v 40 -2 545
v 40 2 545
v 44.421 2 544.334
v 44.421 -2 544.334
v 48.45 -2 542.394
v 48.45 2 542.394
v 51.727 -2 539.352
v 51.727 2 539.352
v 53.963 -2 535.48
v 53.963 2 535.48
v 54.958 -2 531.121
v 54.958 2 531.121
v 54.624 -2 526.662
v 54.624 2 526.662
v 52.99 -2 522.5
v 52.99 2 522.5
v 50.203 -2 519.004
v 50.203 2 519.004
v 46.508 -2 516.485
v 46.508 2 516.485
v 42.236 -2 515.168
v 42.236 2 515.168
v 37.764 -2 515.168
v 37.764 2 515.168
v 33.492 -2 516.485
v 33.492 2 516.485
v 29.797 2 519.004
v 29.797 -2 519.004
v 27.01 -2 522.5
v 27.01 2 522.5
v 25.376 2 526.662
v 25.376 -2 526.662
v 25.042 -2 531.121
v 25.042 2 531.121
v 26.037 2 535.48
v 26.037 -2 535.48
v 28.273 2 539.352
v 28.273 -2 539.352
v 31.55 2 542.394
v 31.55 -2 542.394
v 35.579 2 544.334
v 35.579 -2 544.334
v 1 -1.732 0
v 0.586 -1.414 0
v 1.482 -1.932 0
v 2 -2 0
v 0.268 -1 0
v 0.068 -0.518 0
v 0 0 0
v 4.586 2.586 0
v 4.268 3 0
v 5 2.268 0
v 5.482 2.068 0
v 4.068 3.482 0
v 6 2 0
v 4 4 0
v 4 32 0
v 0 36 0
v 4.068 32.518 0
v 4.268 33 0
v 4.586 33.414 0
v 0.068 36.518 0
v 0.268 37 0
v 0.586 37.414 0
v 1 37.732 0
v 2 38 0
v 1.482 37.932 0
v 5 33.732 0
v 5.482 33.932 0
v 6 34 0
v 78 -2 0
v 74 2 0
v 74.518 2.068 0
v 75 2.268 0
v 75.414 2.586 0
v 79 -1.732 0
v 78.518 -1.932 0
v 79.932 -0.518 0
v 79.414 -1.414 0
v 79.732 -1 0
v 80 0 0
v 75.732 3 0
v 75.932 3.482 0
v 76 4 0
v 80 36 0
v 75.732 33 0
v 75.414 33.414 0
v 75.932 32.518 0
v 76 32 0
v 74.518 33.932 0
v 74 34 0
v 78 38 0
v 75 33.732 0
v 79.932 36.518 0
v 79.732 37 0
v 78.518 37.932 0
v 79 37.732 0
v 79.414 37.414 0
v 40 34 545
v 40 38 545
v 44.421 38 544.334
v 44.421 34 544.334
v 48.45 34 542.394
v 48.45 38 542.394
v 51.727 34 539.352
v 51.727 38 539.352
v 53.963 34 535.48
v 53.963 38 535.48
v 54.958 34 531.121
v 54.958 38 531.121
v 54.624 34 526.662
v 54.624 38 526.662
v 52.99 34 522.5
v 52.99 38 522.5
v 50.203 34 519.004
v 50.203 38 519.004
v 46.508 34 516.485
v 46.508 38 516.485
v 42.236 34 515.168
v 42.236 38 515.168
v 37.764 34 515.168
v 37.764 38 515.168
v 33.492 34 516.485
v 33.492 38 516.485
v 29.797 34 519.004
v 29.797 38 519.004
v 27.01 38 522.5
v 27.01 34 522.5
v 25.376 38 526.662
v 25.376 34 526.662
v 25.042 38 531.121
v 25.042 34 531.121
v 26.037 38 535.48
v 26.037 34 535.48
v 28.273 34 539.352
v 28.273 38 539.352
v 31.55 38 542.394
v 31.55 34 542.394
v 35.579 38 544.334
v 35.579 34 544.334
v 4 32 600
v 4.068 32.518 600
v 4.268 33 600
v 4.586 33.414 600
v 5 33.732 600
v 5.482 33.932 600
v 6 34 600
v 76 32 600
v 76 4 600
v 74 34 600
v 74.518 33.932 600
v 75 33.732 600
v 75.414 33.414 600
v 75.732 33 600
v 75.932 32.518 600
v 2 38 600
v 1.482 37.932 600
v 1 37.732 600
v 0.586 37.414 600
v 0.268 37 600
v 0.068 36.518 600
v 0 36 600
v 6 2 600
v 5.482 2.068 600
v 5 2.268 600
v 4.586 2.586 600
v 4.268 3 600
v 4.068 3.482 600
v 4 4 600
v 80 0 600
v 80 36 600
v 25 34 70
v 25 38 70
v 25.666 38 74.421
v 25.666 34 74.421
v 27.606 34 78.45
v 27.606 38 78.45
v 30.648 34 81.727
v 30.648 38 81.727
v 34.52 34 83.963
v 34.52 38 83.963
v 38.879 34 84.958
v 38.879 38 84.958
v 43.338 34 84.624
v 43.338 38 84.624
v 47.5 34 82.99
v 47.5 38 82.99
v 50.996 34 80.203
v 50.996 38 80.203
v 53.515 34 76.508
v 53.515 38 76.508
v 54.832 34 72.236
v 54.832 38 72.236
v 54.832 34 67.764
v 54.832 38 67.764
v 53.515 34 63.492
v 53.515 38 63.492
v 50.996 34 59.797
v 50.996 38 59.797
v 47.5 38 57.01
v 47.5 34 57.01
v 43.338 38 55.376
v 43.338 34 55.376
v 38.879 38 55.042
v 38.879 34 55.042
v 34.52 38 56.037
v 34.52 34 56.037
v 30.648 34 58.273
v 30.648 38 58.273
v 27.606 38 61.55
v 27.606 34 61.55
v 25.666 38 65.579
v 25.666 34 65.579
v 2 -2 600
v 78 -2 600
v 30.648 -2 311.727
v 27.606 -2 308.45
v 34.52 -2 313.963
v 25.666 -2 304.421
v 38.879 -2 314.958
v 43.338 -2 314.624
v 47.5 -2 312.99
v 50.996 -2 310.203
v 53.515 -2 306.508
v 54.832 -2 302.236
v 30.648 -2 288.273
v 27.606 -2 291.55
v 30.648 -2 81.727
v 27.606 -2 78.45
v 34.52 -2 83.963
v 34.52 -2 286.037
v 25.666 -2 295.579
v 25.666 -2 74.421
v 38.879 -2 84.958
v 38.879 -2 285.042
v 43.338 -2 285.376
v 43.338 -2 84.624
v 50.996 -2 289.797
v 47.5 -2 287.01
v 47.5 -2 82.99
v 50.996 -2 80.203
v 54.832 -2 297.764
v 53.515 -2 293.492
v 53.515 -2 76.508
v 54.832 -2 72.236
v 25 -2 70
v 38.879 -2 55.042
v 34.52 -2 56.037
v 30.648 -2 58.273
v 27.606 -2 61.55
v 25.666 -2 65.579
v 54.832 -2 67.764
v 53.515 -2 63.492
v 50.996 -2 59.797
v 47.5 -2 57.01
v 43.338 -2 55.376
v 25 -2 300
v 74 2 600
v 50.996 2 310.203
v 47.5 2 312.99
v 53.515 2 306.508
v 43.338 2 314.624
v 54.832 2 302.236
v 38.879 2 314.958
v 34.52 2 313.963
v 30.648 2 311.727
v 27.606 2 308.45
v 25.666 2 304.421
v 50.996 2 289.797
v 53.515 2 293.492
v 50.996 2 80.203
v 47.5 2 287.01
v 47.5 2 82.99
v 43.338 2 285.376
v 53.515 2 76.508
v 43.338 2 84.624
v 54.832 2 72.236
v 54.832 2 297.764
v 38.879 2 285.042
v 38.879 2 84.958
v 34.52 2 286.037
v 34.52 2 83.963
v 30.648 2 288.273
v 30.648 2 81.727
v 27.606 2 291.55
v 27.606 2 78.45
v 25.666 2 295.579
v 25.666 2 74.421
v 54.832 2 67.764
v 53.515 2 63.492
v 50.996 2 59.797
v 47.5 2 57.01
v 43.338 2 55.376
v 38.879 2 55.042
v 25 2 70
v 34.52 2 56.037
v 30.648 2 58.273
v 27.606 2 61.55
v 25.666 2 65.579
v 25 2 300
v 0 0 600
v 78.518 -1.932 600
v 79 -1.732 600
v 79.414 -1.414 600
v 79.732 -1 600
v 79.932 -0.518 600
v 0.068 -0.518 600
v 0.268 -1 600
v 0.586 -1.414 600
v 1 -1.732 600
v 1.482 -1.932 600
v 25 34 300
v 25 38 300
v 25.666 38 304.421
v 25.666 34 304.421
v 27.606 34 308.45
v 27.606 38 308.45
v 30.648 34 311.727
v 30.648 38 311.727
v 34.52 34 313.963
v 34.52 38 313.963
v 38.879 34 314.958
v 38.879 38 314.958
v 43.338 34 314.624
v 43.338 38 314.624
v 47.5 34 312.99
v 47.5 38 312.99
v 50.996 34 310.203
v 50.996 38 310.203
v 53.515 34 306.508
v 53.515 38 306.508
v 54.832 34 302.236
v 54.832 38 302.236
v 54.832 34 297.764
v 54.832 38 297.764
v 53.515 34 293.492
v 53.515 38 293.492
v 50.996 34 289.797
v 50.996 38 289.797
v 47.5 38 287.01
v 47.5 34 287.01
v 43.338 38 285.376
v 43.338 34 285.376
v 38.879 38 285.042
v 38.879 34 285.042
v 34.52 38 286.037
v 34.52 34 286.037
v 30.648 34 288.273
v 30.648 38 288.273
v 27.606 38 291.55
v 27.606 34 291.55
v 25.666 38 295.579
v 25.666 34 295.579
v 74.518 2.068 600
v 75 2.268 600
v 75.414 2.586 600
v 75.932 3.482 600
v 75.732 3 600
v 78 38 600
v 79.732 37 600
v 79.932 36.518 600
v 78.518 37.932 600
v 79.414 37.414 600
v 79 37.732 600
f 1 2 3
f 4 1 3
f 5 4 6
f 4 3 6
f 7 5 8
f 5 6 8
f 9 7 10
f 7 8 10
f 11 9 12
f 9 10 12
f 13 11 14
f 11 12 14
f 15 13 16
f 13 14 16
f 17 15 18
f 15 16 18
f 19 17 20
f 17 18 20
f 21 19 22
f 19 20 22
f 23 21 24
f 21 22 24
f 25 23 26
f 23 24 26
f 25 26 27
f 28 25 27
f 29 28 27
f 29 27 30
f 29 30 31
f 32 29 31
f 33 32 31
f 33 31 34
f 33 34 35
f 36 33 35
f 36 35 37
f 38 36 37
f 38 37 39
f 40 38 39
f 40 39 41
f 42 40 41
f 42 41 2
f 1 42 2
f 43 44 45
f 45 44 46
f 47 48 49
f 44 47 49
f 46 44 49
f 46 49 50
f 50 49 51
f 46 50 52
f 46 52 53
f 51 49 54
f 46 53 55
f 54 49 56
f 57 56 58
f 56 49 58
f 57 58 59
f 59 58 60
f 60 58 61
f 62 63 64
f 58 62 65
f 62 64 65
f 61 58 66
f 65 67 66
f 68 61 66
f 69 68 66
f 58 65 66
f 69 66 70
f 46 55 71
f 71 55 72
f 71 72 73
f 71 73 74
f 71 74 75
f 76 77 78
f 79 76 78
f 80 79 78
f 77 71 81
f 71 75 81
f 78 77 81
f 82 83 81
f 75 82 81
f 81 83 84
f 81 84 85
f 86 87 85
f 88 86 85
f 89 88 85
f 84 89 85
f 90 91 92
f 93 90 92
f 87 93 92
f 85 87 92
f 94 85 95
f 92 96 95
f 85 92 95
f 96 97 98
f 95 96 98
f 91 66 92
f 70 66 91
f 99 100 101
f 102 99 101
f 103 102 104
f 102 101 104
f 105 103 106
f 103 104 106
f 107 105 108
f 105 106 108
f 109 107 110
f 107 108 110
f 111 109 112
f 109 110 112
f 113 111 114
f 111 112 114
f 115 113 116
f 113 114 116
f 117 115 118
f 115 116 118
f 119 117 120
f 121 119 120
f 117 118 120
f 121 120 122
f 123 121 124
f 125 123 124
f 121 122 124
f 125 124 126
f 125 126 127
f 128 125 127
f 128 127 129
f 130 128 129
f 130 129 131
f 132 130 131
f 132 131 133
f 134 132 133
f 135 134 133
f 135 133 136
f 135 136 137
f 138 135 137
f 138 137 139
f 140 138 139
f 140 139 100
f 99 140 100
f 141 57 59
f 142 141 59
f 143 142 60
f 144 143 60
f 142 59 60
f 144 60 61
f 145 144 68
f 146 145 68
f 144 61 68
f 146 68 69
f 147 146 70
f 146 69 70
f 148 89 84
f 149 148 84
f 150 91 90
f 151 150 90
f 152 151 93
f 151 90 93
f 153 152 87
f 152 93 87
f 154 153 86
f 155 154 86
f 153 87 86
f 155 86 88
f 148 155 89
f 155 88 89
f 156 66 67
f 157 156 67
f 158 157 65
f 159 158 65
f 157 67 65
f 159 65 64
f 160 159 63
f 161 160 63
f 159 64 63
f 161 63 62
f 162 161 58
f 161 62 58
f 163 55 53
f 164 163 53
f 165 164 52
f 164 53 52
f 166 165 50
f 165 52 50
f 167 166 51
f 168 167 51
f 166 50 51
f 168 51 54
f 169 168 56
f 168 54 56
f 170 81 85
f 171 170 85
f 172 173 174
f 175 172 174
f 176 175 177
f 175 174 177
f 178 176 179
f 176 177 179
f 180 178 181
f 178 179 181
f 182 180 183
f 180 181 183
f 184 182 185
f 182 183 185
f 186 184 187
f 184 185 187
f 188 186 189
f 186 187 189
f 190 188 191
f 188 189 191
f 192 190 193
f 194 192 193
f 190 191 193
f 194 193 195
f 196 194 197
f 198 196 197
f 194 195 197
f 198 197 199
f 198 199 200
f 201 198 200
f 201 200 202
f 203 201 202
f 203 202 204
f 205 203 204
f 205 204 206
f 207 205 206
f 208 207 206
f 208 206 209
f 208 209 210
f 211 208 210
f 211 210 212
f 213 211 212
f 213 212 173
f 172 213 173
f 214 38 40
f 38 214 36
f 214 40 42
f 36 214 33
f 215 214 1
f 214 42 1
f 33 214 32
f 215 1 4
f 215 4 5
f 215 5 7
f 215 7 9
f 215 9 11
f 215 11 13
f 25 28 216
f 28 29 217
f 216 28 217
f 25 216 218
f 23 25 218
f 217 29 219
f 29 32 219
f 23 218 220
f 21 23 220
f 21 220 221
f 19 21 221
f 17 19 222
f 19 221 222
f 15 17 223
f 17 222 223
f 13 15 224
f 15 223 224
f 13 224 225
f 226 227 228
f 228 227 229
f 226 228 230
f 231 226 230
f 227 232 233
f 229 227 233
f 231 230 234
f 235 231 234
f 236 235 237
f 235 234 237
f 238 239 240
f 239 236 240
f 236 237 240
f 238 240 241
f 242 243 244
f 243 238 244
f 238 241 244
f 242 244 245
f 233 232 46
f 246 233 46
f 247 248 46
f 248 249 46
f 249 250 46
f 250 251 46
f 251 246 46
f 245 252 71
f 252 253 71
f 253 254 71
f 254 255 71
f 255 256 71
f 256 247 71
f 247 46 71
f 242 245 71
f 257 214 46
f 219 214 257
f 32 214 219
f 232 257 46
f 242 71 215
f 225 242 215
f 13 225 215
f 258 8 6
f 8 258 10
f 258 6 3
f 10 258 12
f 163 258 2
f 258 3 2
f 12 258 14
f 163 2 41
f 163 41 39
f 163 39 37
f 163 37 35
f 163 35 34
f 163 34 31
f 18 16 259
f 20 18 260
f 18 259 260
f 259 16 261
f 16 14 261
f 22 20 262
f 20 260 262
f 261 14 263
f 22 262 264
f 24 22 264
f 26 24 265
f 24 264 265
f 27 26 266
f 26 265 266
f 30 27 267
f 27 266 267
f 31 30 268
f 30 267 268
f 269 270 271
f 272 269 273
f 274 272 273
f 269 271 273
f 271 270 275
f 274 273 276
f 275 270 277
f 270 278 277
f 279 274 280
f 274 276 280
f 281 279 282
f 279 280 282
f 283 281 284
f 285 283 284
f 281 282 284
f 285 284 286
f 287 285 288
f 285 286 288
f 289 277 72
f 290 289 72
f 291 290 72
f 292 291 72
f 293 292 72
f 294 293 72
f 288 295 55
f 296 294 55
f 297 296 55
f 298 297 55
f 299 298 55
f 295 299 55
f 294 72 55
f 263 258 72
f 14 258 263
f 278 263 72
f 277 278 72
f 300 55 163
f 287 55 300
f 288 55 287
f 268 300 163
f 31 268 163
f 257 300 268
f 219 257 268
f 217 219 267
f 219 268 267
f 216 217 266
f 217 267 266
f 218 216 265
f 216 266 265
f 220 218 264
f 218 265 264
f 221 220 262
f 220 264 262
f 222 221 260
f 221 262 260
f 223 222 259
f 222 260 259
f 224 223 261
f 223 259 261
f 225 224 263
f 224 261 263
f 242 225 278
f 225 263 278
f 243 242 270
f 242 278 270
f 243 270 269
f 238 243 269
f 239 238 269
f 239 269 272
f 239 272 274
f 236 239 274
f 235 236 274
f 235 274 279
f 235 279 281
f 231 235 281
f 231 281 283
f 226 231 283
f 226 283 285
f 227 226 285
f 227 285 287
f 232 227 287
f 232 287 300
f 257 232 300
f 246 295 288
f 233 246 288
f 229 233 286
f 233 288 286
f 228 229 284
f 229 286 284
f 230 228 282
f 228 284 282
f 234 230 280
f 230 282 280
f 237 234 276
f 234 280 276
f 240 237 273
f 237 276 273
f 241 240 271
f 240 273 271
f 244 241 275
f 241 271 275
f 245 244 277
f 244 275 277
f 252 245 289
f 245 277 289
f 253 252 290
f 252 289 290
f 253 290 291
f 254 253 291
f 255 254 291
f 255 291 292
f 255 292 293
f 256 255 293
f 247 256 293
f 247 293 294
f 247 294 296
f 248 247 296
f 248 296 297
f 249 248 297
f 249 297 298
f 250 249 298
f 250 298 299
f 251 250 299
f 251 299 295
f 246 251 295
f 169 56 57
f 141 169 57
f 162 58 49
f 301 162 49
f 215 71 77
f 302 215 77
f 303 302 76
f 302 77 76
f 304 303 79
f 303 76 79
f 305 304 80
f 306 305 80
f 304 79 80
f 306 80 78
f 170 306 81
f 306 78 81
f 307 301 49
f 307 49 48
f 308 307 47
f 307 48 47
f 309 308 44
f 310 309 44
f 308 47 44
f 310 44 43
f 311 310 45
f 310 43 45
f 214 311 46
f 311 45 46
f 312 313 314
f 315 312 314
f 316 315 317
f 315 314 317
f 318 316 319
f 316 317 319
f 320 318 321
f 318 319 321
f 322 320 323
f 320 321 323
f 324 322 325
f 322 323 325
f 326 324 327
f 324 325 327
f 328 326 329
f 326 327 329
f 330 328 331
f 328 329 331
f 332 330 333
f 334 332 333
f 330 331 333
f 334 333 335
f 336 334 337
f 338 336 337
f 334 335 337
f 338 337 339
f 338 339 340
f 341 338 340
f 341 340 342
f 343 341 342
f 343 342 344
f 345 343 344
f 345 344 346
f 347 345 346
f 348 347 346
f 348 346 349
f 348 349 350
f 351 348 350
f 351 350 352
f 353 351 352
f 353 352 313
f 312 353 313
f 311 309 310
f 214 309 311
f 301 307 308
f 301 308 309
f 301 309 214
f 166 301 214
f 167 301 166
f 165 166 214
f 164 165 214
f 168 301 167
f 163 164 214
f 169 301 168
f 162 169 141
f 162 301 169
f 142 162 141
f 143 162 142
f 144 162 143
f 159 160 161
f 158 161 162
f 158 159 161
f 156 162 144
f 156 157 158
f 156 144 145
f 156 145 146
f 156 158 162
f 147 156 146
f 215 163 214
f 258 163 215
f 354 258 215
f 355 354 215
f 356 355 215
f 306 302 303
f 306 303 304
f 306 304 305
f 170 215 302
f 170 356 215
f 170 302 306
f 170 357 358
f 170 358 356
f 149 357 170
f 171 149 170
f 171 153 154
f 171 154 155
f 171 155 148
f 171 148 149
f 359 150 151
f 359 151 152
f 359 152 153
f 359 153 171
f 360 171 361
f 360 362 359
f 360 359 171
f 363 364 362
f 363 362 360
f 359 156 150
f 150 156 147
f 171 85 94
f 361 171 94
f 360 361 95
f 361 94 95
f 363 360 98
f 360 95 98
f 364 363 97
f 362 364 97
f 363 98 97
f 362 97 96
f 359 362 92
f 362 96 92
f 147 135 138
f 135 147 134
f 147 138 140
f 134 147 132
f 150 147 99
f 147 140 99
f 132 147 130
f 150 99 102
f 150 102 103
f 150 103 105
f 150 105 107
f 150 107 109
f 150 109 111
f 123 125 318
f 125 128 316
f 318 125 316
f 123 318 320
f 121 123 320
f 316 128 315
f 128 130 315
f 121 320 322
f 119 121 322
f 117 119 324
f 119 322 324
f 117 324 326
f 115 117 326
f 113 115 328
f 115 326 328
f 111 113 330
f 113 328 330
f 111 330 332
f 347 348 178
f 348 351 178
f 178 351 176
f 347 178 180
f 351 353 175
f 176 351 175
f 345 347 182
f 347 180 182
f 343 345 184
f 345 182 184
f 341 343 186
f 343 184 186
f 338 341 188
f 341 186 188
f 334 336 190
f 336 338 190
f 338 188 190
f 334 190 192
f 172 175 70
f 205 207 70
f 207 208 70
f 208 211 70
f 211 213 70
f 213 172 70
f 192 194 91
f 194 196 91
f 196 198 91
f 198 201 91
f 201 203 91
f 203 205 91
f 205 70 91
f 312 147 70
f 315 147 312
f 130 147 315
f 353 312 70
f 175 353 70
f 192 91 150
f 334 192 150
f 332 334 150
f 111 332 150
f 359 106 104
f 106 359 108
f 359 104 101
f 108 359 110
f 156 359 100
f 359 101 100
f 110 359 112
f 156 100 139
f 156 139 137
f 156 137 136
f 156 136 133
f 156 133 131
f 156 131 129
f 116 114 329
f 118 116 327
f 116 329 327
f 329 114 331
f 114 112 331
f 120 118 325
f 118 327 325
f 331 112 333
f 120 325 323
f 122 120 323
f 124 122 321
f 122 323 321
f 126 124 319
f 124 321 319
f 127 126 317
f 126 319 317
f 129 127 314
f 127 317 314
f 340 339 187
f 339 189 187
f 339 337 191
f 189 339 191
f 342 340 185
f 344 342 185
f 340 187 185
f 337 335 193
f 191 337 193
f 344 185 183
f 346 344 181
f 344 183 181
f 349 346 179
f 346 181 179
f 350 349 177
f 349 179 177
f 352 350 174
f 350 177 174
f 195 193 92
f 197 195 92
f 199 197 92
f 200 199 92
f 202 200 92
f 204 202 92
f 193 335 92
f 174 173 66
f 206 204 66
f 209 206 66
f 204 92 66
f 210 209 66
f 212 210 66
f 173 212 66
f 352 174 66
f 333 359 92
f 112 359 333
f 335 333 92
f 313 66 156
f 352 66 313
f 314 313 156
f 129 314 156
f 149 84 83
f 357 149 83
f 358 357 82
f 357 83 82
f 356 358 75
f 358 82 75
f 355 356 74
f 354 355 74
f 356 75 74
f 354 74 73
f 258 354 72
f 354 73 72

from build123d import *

# Parameters (mm, degrees)
BOSS_EXTRU_1_DEPTH      = 600
ESQUISSE2_R             = 15
ENL_V_MAT_EXTRU_1_DEPTH = 607.630035524


with BuildPart() as part:
    # Esquisse1 → Boss.-Extru.1 (new body)
    with BuildSketch(Plane.XY):
        with BuildLine():
            Line((2, -2), (78, -2))
            ThreePointArc((78, -2), (79.414213562, -1.414213562), (80, 0))
            Line((80, 0), (80, 36))
            ThreePointArc((80, 36), (79.414213562, 37.414213562), (78, 38))
            Line((78, 38), (2, 38))
            ThreePointArc((2, 38), (0.585786438, 37.414213562), (0, 36))
            Line((0, 36), (0, 0))
            ThreePointArc((0, 0), (0.585786438, -1.414213562), (2, -2))
        make_face()
        with BuildLine():
            Line((4, 4), (4, 32))
            ThreePointArc((4, 32), (4.585786438, 33.414213562), (6, 34))
            Line((6, 34), (74, 34))
            ThreePointArc((74, 34), (75.414213562, 33.414213562), (76, 32))
            Line((76, 32), (76, 4))
            ThreePointArc((76, 4), (75.414213562, 2.585786438), (74, 2))
            Line((74, 2), (6, 2))
            ThreePointArc((6, 2), (4.585786438, 2.585786438), (4, 4))
        make_face(mode=Mode.SUBTRACT)
    extrude(amount=BOSS_EXTRU_1_DEPTH)

    # Esquisse2 → Enlèv. mat.-Extru.1 (cut, through all)
    with BuildSketch(Plane(origin=(0, 38, 0), x_dir=(1, 0, 0), z_dir=(0, 1, 0))):
        with Locations(Location((40, -300, 0), (0, 0, 180))):
            Circle(ESQUISSE2_R)
        with Locations(Location((40, -70, 0), (0, 0, 180))):
            Circle(ESQUISSE2_R)
        with Locations(Location((40, -530, 0), (0, 0, 270))):
            Circle(ESQUISSE2_R)
    extrude(amount=-ENL_V_MAT_EXTRU_1_DEPTH, mode=Mode.SUBTRACT)


solid = part.part
